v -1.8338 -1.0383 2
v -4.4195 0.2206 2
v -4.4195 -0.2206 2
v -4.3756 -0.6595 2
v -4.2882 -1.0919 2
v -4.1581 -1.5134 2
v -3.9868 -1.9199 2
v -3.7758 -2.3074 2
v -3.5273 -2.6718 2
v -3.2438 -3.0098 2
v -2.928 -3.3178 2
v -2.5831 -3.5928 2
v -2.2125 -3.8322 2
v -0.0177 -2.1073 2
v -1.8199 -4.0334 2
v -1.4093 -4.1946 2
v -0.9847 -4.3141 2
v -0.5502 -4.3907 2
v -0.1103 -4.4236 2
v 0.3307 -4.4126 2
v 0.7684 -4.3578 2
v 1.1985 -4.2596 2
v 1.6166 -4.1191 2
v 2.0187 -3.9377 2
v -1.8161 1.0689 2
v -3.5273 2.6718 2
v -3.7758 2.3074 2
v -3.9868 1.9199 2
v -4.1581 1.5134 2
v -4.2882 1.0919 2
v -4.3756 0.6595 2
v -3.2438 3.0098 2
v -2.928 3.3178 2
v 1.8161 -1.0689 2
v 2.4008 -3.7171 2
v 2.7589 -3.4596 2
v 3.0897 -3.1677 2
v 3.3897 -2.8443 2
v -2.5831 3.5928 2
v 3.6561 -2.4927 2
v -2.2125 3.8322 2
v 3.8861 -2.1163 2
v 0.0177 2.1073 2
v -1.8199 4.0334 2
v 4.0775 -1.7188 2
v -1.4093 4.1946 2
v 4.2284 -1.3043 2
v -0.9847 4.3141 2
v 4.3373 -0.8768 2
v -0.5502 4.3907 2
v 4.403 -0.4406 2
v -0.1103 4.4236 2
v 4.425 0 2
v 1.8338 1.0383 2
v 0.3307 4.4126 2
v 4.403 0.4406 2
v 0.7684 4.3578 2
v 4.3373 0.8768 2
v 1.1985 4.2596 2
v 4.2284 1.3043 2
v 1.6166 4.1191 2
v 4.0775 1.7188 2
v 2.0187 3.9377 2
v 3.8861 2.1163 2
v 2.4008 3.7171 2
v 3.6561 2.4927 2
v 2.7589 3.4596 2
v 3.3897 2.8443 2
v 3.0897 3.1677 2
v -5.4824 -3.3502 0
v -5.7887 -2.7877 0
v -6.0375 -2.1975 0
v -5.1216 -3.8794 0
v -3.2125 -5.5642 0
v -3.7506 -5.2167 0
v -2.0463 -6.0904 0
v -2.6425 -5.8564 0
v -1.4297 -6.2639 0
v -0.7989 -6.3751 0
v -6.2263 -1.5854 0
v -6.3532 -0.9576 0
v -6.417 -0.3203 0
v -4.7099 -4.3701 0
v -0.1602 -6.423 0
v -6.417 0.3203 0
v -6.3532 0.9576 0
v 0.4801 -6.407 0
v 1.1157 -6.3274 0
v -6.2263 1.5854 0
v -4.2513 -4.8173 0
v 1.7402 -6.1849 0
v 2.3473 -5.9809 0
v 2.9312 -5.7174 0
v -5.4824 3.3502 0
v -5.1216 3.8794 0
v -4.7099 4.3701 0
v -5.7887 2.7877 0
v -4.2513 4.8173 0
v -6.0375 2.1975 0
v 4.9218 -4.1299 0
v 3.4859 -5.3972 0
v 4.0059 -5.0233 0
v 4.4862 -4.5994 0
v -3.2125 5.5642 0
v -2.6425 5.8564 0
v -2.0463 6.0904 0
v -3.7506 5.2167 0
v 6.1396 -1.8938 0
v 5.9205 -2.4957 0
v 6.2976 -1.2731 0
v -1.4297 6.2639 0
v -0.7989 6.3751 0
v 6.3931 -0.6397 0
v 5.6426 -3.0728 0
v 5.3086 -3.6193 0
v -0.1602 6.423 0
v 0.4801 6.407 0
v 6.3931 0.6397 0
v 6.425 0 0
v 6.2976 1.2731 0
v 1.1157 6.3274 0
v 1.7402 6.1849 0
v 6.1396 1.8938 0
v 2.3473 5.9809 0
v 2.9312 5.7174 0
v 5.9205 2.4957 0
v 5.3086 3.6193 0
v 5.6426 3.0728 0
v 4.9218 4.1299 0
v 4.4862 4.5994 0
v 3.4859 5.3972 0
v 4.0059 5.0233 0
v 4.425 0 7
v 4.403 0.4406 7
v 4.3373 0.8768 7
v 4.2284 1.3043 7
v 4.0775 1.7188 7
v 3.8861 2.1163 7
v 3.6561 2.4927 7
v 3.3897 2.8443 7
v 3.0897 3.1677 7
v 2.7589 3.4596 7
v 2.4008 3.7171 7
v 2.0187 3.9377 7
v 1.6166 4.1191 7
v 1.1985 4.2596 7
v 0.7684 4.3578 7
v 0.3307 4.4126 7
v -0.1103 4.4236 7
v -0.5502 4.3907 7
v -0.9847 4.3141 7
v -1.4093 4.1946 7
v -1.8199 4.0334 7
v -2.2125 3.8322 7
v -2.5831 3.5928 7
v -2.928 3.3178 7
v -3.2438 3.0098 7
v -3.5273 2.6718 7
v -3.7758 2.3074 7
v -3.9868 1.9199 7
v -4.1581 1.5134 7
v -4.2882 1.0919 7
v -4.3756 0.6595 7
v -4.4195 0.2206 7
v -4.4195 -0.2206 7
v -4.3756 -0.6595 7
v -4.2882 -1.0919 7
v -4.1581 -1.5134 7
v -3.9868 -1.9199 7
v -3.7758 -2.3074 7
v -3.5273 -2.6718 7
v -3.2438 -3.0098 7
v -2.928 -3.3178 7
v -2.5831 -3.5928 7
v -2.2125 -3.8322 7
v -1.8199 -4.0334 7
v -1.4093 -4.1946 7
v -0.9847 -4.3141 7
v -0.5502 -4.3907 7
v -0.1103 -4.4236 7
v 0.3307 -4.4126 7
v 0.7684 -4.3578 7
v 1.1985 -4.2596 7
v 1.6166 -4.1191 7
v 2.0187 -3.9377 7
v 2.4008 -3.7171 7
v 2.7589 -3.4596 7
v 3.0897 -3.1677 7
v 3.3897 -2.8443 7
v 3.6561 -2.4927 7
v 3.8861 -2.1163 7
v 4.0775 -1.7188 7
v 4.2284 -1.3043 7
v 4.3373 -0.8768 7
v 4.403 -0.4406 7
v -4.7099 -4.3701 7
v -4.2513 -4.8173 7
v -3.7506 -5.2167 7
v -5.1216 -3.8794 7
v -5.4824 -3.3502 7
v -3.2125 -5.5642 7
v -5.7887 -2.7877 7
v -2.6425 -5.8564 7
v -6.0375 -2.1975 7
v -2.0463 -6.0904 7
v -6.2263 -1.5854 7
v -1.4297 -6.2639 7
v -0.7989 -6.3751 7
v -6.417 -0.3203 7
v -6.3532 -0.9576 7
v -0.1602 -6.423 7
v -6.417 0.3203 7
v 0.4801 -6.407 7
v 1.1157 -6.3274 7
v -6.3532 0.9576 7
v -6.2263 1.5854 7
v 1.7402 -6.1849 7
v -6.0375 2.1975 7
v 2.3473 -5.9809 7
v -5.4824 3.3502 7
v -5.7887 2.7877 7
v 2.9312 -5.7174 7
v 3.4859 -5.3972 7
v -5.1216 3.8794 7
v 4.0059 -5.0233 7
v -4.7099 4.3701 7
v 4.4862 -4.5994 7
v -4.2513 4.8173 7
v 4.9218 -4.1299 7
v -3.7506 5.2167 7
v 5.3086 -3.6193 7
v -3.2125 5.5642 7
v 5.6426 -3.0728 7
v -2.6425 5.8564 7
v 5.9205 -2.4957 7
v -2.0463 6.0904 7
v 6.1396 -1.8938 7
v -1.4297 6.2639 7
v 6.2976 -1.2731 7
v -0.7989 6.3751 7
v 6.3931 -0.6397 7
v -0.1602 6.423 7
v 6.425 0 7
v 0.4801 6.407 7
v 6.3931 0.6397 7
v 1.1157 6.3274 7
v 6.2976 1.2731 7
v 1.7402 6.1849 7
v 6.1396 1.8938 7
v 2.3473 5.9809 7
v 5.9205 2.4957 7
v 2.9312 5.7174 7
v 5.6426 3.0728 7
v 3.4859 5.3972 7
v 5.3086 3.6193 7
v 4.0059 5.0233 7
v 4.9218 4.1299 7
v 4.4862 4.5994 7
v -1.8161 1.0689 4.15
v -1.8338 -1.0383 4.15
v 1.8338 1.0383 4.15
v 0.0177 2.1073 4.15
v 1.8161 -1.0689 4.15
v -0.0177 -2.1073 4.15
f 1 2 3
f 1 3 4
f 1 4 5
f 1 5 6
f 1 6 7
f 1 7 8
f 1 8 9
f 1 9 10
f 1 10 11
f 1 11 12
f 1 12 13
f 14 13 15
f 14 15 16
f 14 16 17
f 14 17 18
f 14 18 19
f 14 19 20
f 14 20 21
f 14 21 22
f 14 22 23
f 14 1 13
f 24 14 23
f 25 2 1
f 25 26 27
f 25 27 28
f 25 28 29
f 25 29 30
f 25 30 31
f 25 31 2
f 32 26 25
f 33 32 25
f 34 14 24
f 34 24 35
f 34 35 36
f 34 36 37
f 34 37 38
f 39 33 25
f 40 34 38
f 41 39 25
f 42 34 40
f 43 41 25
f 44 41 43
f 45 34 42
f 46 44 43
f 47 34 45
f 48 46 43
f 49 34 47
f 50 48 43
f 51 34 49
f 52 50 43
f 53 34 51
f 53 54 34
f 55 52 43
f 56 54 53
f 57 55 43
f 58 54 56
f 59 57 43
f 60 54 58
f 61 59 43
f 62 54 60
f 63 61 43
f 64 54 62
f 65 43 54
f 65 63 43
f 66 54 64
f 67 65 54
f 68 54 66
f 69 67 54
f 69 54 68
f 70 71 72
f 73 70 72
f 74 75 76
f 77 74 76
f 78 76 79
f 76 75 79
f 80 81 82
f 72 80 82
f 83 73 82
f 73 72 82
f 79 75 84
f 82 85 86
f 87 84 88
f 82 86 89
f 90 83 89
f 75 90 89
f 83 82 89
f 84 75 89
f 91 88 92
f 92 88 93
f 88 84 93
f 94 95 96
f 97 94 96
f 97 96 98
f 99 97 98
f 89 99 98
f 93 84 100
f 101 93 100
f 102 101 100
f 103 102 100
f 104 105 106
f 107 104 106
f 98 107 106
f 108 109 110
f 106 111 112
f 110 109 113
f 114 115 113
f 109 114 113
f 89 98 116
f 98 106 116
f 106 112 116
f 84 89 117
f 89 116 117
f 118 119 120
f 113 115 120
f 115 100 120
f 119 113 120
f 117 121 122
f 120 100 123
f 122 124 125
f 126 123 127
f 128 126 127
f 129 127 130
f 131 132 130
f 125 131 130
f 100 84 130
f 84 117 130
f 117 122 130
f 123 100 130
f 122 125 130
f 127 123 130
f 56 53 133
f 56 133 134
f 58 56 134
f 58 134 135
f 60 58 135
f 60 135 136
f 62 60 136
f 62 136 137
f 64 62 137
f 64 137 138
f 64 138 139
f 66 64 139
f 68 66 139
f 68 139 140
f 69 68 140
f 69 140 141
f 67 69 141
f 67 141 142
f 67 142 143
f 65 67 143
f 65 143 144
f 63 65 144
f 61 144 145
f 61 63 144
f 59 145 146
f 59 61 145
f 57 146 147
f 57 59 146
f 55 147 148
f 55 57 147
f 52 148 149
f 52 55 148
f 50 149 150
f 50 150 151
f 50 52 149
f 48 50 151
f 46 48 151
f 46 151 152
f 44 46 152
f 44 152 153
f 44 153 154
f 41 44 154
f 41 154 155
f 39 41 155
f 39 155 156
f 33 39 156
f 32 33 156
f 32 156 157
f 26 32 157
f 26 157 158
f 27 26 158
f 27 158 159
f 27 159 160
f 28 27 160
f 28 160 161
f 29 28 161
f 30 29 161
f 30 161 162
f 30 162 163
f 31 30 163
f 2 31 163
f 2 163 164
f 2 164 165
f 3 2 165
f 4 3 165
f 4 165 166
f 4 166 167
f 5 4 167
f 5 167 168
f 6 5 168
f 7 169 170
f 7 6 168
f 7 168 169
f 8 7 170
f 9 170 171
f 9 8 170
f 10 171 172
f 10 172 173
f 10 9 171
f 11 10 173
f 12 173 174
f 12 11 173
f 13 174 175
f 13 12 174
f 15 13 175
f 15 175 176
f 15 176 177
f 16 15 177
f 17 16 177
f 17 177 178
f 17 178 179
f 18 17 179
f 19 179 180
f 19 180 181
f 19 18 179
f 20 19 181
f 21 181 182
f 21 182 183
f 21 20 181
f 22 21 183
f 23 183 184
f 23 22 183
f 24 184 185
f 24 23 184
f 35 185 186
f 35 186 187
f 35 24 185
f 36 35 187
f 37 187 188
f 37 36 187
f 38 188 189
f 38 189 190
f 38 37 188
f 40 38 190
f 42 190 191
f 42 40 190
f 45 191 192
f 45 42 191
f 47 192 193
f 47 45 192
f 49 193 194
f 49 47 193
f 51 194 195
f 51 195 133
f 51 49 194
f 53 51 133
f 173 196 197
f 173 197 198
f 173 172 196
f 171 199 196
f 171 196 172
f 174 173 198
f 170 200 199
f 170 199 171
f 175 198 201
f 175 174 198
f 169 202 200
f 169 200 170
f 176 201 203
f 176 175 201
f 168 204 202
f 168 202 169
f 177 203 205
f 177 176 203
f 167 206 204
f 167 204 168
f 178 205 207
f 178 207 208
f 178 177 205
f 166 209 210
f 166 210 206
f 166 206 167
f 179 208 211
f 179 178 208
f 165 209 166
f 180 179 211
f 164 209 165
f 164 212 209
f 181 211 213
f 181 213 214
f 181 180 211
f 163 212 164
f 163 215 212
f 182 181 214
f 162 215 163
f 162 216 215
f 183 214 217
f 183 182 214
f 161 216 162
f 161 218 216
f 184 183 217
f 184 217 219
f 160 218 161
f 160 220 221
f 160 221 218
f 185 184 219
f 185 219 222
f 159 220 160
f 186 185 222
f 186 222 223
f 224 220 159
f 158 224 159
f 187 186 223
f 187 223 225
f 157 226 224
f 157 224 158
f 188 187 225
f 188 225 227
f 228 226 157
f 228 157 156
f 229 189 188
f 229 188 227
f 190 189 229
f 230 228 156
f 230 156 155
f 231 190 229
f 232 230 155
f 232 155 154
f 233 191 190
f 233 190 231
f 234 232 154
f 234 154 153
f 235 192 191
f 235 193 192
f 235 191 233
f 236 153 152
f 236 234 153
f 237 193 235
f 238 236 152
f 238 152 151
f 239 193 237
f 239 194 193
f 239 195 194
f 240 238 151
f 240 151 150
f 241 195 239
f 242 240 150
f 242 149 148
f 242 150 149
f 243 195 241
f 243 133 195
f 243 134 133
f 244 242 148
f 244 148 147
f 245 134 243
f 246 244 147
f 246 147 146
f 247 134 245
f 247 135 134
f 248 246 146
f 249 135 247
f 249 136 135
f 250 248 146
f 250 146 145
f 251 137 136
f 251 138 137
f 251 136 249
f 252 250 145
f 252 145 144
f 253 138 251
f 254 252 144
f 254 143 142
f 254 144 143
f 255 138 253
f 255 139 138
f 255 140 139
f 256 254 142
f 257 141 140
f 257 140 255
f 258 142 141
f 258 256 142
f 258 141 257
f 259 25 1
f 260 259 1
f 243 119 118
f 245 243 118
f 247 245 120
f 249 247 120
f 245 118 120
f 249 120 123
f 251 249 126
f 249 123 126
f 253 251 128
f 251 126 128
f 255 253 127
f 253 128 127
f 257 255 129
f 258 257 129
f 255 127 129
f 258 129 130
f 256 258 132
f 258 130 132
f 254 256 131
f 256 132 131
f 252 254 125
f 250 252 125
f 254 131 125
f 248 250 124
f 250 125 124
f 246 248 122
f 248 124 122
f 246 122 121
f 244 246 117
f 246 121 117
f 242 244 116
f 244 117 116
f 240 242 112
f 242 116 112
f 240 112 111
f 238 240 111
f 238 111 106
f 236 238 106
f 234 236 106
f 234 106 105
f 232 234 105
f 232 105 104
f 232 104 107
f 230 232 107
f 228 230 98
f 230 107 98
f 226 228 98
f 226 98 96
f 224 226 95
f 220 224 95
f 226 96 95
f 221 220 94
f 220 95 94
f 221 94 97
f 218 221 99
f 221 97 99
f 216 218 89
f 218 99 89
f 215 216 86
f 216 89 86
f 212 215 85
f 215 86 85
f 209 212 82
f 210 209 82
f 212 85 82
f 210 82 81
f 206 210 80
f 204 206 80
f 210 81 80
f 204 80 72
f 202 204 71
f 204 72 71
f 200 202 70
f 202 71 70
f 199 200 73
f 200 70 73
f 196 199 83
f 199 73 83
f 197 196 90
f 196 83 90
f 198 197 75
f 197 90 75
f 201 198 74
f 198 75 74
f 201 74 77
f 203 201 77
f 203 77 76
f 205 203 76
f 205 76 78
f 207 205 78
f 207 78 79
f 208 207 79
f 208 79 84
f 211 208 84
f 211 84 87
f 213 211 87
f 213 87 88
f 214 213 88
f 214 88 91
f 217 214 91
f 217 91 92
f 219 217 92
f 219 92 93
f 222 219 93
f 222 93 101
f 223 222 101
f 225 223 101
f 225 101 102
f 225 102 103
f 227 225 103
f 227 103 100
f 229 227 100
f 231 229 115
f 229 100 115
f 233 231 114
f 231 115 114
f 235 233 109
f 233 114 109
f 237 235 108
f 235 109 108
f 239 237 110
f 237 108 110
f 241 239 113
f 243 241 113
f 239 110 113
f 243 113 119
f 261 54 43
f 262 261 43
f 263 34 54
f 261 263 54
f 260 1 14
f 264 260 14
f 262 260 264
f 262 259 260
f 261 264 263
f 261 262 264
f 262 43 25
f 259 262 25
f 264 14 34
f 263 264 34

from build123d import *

# Parameters (mm, degrees)
F0_R     = 4.425
F1_DEPTH = 2
F0_R_2   = 6.425
F2_DEPTH = 7
F3_DEPTH = 4.15


with BuildPart() as f1:
    # F0 (on Top) → F1 (new body)
    with BuildSketch(Plane.XY):
        Circle(F0_R)
        Polygon((1.816103, -1.068927), (-0.017667, -2.107254), (-1.833769, -1.038327), (-1.816103, 1.068927), (0.017667, 2.107254), (1.833769, 1.038327), align=None, mode=Mode.SUBTRACT)
    extrude(amount=F1_DEPTH)

    # F0 (on Top) → F2 (join)
    with BuildSketch(Plane.XY):
        Circle(F0_R_2)
        Circle(F0_R, mode=Mode.SUBTRACT)
    extrude(amount=F2_DEPTH)

    # F0 (on Top) → F3 (join)
    with BuildSketch(Plane.XY):
        Polygon((-1.833769, -1.038327), (-0.017667, -2.107254), (1.816103, -1.068927), (1.833769, 1.038327), (0.017667, 2.107254), (-1.816103, 1.068927), align=None)
    extrude(amount=F3_DEPTH)


solid = f1.part
